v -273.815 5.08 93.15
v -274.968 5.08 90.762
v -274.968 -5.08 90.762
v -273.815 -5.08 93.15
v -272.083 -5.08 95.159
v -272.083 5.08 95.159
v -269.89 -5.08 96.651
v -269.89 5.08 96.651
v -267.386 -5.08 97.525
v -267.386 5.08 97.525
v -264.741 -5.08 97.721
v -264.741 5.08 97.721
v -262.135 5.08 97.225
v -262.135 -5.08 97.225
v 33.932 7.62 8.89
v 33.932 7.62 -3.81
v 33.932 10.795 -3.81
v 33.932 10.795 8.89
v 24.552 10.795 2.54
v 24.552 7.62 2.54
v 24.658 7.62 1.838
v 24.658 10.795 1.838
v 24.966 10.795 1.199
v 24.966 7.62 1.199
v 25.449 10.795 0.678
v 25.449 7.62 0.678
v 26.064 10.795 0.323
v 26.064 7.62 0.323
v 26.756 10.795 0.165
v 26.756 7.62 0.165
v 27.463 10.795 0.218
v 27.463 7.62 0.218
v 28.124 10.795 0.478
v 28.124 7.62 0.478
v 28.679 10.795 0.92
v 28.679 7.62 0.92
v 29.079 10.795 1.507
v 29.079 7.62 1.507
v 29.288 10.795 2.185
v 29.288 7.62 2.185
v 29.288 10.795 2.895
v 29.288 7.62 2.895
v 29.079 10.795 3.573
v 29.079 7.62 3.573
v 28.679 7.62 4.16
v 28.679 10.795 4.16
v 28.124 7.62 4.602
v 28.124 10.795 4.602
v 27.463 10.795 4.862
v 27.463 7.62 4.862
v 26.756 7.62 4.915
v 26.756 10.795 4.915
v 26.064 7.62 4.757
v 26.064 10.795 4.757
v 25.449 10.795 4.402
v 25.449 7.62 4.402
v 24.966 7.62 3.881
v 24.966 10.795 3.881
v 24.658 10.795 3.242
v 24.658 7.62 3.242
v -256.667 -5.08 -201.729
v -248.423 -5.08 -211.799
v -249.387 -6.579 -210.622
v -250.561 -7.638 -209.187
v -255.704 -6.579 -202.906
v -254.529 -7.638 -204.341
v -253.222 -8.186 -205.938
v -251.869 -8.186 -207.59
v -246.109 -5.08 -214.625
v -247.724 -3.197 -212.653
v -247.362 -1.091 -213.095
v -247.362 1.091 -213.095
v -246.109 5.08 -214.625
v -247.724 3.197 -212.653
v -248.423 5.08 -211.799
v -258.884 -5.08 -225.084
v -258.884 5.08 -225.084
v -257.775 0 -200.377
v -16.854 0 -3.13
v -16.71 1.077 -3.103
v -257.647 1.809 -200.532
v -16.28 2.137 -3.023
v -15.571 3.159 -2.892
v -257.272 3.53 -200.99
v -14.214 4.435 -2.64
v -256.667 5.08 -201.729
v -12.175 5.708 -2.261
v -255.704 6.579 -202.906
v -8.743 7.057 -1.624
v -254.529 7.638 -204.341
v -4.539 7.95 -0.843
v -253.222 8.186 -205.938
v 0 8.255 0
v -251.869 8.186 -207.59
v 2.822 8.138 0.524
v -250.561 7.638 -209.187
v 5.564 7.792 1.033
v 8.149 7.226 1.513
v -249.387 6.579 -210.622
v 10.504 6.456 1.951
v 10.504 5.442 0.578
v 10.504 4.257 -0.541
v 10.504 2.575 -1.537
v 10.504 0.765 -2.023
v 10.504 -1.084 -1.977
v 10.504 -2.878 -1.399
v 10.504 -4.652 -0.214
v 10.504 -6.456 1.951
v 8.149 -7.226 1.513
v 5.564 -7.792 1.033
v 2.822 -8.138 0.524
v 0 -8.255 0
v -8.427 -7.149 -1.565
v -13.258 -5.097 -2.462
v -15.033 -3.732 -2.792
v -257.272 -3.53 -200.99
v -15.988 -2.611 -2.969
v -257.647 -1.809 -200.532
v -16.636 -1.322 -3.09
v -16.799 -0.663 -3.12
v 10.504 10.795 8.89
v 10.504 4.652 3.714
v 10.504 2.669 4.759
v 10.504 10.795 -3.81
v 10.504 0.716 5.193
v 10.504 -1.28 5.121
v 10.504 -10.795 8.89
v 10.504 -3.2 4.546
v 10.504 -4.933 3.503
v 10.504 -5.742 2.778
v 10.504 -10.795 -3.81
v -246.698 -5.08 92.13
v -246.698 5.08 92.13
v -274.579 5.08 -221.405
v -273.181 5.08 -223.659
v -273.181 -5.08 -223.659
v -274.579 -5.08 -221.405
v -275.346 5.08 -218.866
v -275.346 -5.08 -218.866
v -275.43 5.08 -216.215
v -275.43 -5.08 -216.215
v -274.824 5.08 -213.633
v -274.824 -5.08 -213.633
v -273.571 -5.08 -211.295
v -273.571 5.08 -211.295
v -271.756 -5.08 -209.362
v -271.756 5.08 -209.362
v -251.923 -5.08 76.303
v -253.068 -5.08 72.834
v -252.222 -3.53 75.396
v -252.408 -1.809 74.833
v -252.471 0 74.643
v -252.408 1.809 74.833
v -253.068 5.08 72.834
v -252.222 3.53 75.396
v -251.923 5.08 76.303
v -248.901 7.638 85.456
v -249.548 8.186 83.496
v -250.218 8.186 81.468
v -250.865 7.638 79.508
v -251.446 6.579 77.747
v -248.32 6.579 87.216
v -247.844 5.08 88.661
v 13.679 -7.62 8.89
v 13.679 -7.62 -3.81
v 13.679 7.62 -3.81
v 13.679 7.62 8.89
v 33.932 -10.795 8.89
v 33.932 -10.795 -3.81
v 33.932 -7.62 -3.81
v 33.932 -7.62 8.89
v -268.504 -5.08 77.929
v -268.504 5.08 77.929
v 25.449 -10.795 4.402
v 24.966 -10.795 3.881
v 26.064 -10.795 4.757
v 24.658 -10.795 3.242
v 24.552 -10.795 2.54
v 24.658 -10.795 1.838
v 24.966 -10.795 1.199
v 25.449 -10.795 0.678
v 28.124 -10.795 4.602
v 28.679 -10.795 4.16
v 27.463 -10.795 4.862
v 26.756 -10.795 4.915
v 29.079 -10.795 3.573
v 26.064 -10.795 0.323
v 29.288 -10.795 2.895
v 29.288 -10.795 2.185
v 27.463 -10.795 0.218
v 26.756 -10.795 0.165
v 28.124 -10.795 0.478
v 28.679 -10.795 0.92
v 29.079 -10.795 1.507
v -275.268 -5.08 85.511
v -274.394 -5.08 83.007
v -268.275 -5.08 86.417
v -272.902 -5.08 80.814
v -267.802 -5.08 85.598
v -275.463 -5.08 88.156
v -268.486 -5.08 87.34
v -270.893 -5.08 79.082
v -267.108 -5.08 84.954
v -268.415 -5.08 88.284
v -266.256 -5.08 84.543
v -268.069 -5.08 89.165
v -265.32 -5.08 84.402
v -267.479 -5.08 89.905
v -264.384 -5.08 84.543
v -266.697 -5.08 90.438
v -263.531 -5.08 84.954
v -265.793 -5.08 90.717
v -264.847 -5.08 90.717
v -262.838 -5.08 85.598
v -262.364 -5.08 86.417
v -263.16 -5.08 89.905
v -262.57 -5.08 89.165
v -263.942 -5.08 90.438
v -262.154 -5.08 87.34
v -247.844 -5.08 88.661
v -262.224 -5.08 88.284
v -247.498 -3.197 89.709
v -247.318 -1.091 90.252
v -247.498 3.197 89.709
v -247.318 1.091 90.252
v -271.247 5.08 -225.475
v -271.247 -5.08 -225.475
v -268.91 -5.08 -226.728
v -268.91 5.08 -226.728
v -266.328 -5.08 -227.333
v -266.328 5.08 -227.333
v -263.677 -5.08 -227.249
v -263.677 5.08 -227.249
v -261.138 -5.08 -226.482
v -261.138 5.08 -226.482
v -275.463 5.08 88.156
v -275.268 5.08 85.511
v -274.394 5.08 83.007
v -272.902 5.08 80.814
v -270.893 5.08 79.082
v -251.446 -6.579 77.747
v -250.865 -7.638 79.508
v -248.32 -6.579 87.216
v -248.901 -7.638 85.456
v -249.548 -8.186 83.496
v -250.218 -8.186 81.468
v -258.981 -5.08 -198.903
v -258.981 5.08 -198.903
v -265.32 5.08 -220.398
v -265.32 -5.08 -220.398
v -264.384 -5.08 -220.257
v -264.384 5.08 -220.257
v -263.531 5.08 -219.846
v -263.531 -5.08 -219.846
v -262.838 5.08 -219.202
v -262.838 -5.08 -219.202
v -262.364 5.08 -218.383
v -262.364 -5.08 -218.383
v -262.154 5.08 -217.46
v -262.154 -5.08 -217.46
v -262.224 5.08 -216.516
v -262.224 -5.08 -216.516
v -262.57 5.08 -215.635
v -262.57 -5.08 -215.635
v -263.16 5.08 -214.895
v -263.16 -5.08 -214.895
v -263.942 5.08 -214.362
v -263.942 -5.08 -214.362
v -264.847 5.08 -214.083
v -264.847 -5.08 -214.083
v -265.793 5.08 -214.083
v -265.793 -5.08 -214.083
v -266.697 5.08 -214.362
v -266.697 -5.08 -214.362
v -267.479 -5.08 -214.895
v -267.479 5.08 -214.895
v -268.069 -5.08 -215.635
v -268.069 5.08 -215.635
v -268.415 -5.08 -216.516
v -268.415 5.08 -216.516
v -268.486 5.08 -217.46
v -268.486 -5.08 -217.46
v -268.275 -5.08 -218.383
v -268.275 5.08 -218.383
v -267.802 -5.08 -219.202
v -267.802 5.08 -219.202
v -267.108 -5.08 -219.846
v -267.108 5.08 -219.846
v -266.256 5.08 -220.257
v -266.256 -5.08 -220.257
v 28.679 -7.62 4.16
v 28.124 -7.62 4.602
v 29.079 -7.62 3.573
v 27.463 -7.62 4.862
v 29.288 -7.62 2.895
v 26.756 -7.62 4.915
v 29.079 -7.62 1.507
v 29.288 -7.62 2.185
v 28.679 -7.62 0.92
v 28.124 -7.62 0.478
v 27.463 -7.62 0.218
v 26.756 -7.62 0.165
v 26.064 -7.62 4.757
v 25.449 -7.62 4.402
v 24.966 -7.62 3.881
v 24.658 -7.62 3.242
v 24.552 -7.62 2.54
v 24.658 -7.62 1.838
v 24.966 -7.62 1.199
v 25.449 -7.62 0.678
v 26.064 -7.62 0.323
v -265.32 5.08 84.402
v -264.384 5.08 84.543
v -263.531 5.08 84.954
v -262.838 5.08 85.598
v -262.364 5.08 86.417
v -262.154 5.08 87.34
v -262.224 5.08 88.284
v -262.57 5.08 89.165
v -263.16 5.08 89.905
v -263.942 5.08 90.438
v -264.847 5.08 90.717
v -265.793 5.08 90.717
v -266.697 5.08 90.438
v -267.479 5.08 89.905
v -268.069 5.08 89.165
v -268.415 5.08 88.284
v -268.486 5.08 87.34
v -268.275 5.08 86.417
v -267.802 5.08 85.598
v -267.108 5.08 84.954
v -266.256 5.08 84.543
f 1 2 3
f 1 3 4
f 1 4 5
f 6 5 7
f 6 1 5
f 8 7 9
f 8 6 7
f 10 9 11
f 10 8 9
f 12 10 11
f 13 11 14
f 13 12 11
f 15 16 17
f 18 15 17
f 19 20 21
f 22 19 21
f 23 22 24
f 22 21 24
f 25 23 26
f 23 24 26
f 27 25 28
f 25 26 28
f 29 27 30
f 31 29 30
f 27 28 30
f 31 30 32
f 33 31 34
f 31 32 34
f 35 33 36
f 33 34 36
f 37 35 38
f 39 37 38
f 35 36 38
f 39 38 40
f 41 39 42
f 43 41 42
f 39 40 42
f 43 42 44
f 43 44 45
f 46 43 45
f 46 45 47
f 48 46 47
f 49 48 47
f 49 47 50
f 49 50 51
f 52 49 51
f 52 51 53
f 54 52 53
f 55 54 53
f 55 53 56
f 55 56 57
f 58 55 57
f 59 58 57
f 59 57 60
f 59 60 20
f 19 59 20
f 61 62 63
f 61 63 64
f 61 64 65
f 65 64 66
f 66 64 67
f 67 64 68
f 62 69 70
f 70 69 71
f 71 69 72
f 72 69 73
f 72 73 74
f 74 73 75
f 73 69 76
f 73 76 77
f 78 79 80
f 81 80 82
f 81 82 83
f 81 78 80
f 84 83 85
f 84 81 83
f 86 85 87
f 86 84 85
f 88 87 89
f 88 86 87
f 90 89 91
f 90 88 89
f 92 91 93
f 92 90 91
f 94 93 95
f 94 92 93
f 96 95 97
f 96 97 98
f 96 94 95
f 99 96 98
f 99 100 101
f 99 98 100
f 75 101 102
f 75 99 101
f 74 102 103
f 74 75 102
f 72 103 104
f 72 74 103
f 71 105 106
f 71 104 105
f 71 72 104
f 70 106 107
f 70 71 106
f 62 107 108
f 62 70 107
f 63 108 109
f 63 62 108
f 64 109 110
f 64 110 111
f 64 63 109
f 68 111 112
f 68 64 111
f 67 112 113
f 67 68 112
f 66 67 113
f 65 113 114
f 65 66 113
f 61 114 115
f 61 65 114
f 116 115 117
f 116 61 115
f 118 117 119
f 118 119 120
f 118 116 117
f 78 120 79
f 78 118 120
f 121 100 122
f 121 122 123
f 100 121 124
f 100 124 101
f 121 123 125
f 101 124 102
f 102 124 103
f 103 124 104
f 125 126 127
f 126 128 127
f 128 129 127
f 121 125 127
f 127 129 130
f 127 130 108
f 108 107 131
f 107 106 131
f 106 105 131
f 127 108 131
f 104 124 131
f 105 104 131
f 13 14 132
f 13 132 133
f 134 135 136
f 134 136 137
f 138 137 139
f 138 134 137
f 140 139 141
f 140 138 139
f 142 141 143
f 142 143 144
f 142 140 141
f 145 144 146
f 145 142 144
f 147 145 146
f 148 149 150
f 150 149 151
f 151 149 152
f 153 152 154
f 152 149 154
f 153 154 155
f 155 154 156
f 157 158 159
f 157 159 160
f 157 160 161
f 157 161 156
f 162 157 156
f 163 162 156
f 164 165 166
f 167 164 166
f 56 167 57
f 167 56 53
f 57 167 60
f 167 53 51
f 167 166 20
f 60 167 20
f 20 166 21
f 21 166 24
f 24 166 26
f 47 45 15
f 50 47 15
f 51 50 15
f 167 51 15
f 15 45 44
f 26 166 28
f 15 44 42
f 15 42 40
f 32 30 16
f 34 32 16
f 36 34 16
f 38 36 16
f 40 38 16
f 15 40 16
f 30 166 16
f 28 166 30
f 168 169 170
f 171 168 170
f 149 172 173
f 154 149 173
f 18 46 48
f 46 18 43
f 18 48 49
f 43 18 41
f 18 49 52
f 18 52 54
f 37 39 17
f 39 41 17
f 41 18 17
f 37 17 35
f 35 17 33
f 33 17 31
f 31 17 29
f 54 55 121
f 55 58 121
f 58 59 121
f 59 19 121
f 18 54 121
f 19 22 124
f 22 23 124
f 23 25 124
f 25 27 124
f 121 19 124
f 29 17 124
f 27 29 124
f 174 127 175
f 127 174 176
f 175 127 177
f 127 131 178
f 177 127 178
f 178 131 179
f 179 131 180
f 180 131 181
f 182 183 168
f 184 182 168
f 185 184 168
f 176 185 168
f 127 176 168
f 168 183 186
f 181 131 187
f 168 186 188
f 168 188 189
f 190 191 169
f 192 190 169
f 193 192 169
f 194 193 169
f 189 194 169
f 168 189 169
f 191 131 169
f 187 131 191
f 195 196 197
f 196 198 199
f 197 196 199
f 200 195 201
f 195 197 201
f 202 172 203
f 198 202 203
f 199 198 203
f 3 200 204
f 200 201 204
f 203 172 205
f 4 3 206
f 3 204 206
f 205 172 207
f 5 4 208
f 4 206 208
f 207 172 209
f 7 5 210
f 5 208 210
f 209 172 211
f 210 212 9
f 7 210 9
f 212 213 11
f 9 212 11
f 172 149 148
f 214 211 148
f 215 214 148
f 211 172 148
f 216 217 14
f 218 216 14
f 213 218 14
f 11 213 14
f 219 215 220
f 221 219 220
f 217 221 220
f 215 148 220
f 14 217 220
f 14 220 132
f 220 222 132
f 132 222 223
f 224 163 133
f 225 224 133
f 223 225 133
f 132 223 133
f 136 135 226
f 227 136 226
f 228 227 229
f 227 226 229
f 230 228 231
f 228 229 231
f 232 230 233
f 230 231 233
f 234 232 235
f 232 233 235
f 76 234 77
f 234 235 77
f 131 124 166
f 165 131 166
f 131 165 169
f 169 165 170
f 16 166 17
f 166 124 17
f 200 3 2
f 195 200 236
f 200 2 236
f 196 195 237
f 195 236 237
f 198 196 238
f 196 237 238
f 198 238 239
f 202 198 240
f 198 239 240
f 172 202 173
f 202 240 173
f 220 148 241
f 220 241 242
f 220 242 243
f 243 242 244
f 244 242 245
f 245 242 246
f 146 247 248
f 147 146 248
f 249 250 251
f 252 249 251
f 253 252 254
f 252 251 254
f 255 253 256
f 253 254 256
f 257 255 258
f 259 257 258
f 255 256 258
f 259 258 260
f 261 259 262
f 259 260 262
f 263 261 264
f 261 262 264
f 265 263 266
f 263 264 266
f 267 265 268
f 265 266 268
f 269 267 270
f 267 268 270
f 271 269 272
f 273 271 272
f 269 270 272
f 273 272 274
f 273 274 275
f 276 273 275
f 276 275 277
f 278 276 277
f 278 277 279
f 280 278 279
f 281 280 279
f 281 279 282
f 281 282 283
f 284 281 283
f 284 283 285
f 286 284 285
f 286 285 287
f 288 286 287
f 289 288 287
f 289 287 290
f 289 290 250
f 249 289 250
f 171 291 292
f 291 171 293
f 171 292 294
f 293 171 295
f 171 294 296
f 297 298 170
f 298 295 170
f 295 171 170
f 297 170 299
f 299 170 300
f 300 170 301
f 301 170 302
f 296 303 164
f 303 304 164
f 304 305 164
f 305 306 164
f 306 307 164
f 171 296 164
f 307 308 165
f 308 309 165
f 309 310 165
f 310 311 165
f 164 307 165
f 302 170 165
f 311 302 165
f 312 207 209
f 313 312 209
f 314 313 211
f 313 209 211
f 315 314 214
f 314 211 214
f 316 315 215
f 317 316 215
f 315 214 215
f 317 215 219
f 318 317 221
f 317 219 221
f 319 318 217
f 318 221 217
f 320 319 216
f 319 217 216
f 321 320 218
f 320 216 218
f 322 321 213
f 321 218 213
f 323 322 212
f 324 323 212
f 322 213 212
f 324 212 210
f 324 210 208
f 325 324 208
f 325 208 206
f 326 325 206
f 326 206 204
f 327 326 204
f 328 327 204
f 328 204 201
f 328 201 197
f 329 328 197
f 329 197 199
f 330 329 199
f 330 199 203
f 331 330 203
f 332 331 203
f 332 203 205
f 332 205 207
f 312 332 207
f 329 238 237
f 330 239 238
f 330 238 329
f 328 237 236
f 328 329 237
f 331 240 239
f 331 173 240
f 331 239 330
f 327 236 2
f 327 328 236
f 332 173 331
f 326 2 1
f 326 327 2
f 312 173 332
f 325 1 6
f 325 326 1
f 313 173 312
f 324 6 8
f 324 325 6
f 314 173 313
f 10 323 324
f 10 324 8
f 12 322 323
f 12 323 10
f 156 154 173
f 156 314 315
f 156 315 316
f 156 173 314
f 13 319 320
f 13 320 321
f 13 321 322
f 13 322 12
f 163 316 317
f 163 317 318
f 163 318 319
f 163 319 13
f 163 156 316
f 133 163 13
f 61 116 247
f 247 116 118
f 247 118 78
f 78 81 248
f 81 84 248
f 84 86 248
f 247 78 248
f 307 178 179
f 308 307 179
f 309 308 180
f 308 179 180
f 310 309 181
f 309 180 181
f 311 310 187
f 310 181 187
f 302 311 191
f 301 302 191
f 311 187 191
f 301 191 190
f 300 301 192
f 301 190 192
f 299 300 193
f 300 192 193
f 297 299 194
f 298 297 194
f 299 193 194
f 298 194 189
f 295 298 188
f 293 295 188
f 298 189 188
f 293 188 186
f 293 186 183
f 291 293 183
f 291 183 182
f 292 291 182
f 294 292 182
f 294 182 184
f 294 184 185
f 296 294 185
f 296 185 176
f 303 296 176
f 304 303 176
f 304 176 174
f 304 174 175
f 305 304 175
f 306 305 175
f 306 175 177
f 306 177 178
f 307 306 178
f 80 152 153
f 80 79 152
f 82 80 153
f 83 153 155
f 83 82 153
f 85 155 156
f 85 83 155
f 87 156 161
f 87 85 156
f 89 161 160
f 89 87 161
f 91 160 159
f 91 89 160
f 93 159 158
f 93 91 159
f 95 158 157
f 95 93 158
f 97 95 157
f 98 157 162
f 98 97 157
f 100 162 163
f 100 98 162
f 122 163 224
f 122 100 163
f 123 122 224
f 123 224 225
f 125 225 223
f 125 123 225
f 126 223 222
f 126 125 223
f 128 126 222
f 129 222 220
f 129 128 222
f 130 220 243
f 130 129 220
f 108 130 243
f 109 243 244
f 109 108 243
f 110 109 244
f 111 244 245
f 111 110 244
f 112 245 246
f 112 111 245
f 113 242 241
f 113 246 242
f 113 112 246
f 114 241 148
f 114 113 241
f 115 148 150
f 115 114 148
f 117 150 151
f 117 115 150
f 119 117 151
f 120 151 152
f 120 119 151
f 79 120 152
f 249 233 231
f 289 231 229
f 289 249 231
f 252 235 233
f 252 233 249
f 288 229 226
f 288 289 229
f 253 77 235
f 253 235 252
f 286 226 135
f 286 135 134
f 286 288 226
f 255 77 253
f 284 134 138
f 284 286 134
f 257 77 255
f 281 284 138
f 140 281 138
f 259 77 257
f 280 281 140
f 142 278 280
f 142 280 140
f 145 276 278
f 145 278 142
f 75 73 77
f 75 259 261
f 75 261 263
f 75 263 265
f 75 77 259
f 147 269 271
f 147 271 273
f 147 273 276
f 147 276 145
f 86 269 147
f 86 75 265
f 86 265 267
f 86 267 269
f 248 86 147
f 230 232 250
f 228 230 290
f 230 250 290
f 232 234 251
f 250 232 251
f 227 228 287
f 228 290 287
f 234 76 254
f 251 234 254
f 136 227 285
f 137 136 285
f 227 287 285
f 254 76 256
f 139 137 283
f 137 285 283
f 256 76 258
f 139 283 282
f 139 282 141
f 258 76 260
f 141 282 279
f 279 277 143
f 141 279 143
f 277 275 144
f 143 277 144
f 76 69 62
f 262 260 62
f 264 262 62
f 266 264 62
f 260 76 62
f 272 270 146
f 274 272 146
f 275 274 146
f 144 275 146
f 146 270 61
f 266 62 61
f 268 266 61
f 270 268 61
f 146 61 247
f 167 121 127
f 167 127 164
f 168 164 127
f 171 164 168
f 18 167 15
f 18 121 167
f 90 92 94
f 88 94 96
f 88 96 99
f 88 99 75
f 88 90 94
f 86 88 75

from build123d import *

# Parameters (mm, degrees)
SKETCH2_R                      = 8.255
BOSS_EXTRUDE1_DEPTH            = 8.89
BOSS_EXTRUDE1_DEPTH_BACK       = 3.81
BOSS_EXTRUDE2_DEPTH            = 10.16
BOSS_EXTRUDE2_DEPTH_BACK       = 16.256
SKETCH4_W                      = 20.32
SKETCH4_H                      = 10.16
BOSS_EXTRUDE3_DEPTH            = 10.16
BOSS_EXTRUDE3_DEPTH_BACK       = 16.51
SKETCH5_W                      = 20.32
SKETCH5_H                      = 10.16
CUT_EXTRUDE1_DEPTH             = 364.372587018
CUT_EXTRUDE2_DEPTH             = 360.616172571
CUT_EXTRUDE3_START             = -16.256
CUT_EXTRUDE3_DEPTH             = 16.256
CUT_EXTRUDE4_DEPTH             = 16.51
E_0_25_DIAMETER_HOLE1_D        = 6.35
E_0_25_DIAMETER_HOLE1_DEPTH    = 19.05
E_0_25_DIAMETER_HOLE1_TIP      = 1.907732465
F_3_16_0_1875_DIAMETER_HOLE1_D = 4.7625
CUT_EXTRUDE5_DEPTH             = 364.084786631


with BuildPart() as part:
    # Sweep1: sweep along a path in Sketch1
    with BuildLine(Plane(origin=(0, 0, 0), x_dir=(1, 0, 0), z_dir=(0, 1, 0))) as sweep1_path:
        Line((-265.319834303, -87.577083333), (0, 0))
        Line((0, 0), (-265.319834303, 217.222916667))
    # Sketch2 → Sweep1 (sweep)
    with BuildSketch(Plane(origin=(-265.319834303, 0, 87.577083333), x_dir=(-0.3134469696969697, 0, -0.949605706168506), z_dir=(0.949605706168506, 0, -0.3134469696969697))):
        Circle(SKETCH2_R)
    sweep(path=sweep1_path.line, transition=Transition.RIGHT)

    # Sketch3 → Boss-Extrude1 (add, two sides: drawn at the far end of the back side and taken through both)
    with BuildSketch(Plane.XY.offset(-BOSS_EXTRUDE1_DEPTH_BACK)):
        Polygon((33.931753368, 10.795), (10.503958333, 10.795), (10.503958333, -10.795), (33.931753368, -10.795), (33.931753368, -7.62), (13.678958333, -7.62), (13.678958333, 7.62), (33.931753368, 7.62), align=None)
    extrude(amount=BOSS_EXTRUDE1_DEPTH + BOSS_EXTRUDE1_DEPTH_BACK)

    # Sketch4 → Boss-Extrude2 (add, two sides: drawn at the far end of the back side and taken through both)
    with BuildSketch(Plane(origin=(-265.319834303, 0, 87.577083333), x_dir=(0.3134469696969697, 0, 0.949605706168506), z_dir=(-0.949605706168506, 0, 0.3134469696969697)).offset(-BOSS_EXTRUDE2_DEPTH_BACK)):
        Rectangle(SKETCH4_W, SKETCH4_H)
    extrude(amount=BOSS_EXTRUDE2_DEPTH + BOSS_EXTRUDE2_DEPTH_BACK)

    # Sketch5 → Boss-Extrude3 (add, two sides: drawn at the far end of the back side and taken through both)
    with BuildSketch(Plane(origin=(-265.319834303, 0, -217.222916667), x_dir=(-0.633487654320988, 0, 0.7737527976187824), z_dir=(-0.7737527976187824, 0, -0.633487654320988)).offset(-BOSS_EXTRUDE3_DEPTH_BACK)):
        Rectangle(SKETCH5_W, SKETCH5_H)
    extrude(amount=BOSS_EXTRUDE3_DEPTH + BOSS_EXTRUDE3_DEPTH_BACK)

    # Sketch6 → Cut-Extrude1 (cut, through all)
    with BuildSketch(Plane(origin=(0, 5.08, 0), x_dir=(1, 0, 0), z_dir=(0, 1, 0))):
        with BuildLine():
            Line((-271.756068871, 209.361588243), (-279.617397295, 215.797822811))
            Line((-279.617397295, 215.797822811), (-273.181162727, 223.659151235))
            ThreePointArc((-273.181162727, 223.659151235), (-275.429738049, 216.215223137), (-271.756068871, 209.361588243))
        make_face()
    cut_extrude1 = extrude(amount=-CUT_EXTRUDE1_DEPTH, mode=Mode.SUBTRACT)

    # Mirror1: Cut-Extrude1 across plane
    add(cut_extrude1.mirror(Plane(origin=(0, 0, 0), x_dir=(0.7737527976187827, 0, 0.6334876543209876), z_dir=(-0.633487654320988, 0, 0.7737527976187826))), mode=Mode.SUBTRACT)

    # Sketch7 → Cut-Extrude2 (cut, through all)
    with BuildSketch(Plane(origin=(0, 5.08, 0), x_dir=(1, 0, 0), z_dir=(0, 1, 0))):
        with BuildLine():
            Line((-262.135213091, -97.225077308), (-271.783207066, -100.40969852))
            Line((-271.783207066, -100.40969852), (-274.967828278, -90.761704545))
            ThreePointArc((-274.967828278, -90.761704545), (-269.890129013, -96.651112552), (-262.135213091, -97.225077308))
        make_face()
    cut_extrude2 = extrude(amount=-CUT_EXTRUDE2_DEPTH, mode=Mode.SUBTRACT)

    # Mirror2: Cut-Extrude2 across plane
    add(cut_extrude2.mirror(Plane(origin=(0, 0, 0), x_dir=(0.9496057061685059, 0, -0.3134469696969697), z_dir=(0.3134469696969697, 0, 0.949605706168506))), mode=Mode.SUBTRACT)

    # Sketch8 → Cut-Extrude3 (cut)
    with BuildSketch(Plane(origin=(-265.319834303, 0, 87.577083333), x_dir=(0.3134469696969697, 0, 0.949605706168506), z_dir=(-0.949605706168506, 0, 0.3134469696969697)).offset(CUT_EXTRUDE3_START)):
        with BuildLine():
            Line((6.506813736, -5.08), (-6.506813736, -5.08))
            ThreePointArc((-6.506813736, -5.08), (0, -8.255), (6.506813736, -5.08))
        make_face()
        with BuildLine():
            Line((-6.506813736, 5.08), (6.506813736, 5.08))
            ThreePointArc((6.506813736, 5.08), (0, 8.255), (-6.506813736, 5.08))
        make_face()
    extrude(amount=CUT_EXTRUDE3_DEPTH, mode=Mode.SUBTRACT)

    # Sketch9 → Cut-Extrude4 (cut)
    with BuildSketch(Plane(origin=(-265.319834303, 0, -217.222916667), x_dir=(-0.633487654320988, 0, 0.7737527976187824), z_dir=(-0.7737527976187824, 0, -0.633487654320988))):
        with BuildLine():
            Line((6.506813736, -5.08), (-6.506813736, -5.08))
            ThreePointArc((-6.506813736, -5.08), (0, -8.255), (6.506813736, -5.08))
        make_face()
        with BuildLine():
            Line((-6.506813736, 5.08), (6.506813736, 5.08))
            ThreePointArc((6.506813736, 5.08), (0, 8.255), (-6.506813736, 5.08))
        make_face()
    extrude(amount=-CUT_EXTRUDE4_DEPTH, mode=Mode.SUBTRACT)

    # E (0.25) Diameter Hole1
    with Locations(Plane(origin=(-265.319834303, 5.08, -217.222916667), x_dir=(0, 0, 1), z_dir=(0, 1, 0))):
        with Locations((0, 0), (304.8, 0)):
            Hole(E_0_25_DIAMETER_HOLE1_D / 2, depth=E_0_25_DIAMETER_HOLE1_DEPTH)
            with Locations((0, 0, -(E_0_25_DIAMETER_HOLE1_DEPTH + E_0_25_DIAMETER_HOLE1_TIP / 2))):  # 118° drill point
                Cone(0, E_0_25_DIAMETER_HOLE1_D / 2, E_0_25_DIAMETER_HOLE1_TIP, mode=Mode.SUBTRACT)

    # 3/16 (0.1875) Diameter Hole1 (through all)
    with Locations(Plane(origin=(0, 10.795, 0), x_dir=(1, 0, 0), z_dir=(0, 1, 0))):
        with Locations((26.933488785, -2.54)):
            Hole(F_3_16_0_1875_DIAMETER_HOLE1_D / 2)

    # Sketch14 → Cut-Extrude5 (cut, through all)
    with BuildSketch(Plane.XY.offset(8.89)):
        with BuildLine():
            Line((13.678958333, 4.822488189), (13.678958333, -4.822488189))
            add(Edge.make_bspline(
                [(13.678958333, -4.822488189), (20.76590224, 0), (13.678958333, 4.822488189)],
                knots=[5.659303655, 5.659303655, 5.659303655, 6.907066959, 6.907066959, 6.907066959], degree=2, weights=[1, 0.811616954, 1]))
        make_face()
    extrude(amount=-CUT_EXTRUDE5_DEPTH, mode=Mode.SUBTRACT)


solid = part.part
